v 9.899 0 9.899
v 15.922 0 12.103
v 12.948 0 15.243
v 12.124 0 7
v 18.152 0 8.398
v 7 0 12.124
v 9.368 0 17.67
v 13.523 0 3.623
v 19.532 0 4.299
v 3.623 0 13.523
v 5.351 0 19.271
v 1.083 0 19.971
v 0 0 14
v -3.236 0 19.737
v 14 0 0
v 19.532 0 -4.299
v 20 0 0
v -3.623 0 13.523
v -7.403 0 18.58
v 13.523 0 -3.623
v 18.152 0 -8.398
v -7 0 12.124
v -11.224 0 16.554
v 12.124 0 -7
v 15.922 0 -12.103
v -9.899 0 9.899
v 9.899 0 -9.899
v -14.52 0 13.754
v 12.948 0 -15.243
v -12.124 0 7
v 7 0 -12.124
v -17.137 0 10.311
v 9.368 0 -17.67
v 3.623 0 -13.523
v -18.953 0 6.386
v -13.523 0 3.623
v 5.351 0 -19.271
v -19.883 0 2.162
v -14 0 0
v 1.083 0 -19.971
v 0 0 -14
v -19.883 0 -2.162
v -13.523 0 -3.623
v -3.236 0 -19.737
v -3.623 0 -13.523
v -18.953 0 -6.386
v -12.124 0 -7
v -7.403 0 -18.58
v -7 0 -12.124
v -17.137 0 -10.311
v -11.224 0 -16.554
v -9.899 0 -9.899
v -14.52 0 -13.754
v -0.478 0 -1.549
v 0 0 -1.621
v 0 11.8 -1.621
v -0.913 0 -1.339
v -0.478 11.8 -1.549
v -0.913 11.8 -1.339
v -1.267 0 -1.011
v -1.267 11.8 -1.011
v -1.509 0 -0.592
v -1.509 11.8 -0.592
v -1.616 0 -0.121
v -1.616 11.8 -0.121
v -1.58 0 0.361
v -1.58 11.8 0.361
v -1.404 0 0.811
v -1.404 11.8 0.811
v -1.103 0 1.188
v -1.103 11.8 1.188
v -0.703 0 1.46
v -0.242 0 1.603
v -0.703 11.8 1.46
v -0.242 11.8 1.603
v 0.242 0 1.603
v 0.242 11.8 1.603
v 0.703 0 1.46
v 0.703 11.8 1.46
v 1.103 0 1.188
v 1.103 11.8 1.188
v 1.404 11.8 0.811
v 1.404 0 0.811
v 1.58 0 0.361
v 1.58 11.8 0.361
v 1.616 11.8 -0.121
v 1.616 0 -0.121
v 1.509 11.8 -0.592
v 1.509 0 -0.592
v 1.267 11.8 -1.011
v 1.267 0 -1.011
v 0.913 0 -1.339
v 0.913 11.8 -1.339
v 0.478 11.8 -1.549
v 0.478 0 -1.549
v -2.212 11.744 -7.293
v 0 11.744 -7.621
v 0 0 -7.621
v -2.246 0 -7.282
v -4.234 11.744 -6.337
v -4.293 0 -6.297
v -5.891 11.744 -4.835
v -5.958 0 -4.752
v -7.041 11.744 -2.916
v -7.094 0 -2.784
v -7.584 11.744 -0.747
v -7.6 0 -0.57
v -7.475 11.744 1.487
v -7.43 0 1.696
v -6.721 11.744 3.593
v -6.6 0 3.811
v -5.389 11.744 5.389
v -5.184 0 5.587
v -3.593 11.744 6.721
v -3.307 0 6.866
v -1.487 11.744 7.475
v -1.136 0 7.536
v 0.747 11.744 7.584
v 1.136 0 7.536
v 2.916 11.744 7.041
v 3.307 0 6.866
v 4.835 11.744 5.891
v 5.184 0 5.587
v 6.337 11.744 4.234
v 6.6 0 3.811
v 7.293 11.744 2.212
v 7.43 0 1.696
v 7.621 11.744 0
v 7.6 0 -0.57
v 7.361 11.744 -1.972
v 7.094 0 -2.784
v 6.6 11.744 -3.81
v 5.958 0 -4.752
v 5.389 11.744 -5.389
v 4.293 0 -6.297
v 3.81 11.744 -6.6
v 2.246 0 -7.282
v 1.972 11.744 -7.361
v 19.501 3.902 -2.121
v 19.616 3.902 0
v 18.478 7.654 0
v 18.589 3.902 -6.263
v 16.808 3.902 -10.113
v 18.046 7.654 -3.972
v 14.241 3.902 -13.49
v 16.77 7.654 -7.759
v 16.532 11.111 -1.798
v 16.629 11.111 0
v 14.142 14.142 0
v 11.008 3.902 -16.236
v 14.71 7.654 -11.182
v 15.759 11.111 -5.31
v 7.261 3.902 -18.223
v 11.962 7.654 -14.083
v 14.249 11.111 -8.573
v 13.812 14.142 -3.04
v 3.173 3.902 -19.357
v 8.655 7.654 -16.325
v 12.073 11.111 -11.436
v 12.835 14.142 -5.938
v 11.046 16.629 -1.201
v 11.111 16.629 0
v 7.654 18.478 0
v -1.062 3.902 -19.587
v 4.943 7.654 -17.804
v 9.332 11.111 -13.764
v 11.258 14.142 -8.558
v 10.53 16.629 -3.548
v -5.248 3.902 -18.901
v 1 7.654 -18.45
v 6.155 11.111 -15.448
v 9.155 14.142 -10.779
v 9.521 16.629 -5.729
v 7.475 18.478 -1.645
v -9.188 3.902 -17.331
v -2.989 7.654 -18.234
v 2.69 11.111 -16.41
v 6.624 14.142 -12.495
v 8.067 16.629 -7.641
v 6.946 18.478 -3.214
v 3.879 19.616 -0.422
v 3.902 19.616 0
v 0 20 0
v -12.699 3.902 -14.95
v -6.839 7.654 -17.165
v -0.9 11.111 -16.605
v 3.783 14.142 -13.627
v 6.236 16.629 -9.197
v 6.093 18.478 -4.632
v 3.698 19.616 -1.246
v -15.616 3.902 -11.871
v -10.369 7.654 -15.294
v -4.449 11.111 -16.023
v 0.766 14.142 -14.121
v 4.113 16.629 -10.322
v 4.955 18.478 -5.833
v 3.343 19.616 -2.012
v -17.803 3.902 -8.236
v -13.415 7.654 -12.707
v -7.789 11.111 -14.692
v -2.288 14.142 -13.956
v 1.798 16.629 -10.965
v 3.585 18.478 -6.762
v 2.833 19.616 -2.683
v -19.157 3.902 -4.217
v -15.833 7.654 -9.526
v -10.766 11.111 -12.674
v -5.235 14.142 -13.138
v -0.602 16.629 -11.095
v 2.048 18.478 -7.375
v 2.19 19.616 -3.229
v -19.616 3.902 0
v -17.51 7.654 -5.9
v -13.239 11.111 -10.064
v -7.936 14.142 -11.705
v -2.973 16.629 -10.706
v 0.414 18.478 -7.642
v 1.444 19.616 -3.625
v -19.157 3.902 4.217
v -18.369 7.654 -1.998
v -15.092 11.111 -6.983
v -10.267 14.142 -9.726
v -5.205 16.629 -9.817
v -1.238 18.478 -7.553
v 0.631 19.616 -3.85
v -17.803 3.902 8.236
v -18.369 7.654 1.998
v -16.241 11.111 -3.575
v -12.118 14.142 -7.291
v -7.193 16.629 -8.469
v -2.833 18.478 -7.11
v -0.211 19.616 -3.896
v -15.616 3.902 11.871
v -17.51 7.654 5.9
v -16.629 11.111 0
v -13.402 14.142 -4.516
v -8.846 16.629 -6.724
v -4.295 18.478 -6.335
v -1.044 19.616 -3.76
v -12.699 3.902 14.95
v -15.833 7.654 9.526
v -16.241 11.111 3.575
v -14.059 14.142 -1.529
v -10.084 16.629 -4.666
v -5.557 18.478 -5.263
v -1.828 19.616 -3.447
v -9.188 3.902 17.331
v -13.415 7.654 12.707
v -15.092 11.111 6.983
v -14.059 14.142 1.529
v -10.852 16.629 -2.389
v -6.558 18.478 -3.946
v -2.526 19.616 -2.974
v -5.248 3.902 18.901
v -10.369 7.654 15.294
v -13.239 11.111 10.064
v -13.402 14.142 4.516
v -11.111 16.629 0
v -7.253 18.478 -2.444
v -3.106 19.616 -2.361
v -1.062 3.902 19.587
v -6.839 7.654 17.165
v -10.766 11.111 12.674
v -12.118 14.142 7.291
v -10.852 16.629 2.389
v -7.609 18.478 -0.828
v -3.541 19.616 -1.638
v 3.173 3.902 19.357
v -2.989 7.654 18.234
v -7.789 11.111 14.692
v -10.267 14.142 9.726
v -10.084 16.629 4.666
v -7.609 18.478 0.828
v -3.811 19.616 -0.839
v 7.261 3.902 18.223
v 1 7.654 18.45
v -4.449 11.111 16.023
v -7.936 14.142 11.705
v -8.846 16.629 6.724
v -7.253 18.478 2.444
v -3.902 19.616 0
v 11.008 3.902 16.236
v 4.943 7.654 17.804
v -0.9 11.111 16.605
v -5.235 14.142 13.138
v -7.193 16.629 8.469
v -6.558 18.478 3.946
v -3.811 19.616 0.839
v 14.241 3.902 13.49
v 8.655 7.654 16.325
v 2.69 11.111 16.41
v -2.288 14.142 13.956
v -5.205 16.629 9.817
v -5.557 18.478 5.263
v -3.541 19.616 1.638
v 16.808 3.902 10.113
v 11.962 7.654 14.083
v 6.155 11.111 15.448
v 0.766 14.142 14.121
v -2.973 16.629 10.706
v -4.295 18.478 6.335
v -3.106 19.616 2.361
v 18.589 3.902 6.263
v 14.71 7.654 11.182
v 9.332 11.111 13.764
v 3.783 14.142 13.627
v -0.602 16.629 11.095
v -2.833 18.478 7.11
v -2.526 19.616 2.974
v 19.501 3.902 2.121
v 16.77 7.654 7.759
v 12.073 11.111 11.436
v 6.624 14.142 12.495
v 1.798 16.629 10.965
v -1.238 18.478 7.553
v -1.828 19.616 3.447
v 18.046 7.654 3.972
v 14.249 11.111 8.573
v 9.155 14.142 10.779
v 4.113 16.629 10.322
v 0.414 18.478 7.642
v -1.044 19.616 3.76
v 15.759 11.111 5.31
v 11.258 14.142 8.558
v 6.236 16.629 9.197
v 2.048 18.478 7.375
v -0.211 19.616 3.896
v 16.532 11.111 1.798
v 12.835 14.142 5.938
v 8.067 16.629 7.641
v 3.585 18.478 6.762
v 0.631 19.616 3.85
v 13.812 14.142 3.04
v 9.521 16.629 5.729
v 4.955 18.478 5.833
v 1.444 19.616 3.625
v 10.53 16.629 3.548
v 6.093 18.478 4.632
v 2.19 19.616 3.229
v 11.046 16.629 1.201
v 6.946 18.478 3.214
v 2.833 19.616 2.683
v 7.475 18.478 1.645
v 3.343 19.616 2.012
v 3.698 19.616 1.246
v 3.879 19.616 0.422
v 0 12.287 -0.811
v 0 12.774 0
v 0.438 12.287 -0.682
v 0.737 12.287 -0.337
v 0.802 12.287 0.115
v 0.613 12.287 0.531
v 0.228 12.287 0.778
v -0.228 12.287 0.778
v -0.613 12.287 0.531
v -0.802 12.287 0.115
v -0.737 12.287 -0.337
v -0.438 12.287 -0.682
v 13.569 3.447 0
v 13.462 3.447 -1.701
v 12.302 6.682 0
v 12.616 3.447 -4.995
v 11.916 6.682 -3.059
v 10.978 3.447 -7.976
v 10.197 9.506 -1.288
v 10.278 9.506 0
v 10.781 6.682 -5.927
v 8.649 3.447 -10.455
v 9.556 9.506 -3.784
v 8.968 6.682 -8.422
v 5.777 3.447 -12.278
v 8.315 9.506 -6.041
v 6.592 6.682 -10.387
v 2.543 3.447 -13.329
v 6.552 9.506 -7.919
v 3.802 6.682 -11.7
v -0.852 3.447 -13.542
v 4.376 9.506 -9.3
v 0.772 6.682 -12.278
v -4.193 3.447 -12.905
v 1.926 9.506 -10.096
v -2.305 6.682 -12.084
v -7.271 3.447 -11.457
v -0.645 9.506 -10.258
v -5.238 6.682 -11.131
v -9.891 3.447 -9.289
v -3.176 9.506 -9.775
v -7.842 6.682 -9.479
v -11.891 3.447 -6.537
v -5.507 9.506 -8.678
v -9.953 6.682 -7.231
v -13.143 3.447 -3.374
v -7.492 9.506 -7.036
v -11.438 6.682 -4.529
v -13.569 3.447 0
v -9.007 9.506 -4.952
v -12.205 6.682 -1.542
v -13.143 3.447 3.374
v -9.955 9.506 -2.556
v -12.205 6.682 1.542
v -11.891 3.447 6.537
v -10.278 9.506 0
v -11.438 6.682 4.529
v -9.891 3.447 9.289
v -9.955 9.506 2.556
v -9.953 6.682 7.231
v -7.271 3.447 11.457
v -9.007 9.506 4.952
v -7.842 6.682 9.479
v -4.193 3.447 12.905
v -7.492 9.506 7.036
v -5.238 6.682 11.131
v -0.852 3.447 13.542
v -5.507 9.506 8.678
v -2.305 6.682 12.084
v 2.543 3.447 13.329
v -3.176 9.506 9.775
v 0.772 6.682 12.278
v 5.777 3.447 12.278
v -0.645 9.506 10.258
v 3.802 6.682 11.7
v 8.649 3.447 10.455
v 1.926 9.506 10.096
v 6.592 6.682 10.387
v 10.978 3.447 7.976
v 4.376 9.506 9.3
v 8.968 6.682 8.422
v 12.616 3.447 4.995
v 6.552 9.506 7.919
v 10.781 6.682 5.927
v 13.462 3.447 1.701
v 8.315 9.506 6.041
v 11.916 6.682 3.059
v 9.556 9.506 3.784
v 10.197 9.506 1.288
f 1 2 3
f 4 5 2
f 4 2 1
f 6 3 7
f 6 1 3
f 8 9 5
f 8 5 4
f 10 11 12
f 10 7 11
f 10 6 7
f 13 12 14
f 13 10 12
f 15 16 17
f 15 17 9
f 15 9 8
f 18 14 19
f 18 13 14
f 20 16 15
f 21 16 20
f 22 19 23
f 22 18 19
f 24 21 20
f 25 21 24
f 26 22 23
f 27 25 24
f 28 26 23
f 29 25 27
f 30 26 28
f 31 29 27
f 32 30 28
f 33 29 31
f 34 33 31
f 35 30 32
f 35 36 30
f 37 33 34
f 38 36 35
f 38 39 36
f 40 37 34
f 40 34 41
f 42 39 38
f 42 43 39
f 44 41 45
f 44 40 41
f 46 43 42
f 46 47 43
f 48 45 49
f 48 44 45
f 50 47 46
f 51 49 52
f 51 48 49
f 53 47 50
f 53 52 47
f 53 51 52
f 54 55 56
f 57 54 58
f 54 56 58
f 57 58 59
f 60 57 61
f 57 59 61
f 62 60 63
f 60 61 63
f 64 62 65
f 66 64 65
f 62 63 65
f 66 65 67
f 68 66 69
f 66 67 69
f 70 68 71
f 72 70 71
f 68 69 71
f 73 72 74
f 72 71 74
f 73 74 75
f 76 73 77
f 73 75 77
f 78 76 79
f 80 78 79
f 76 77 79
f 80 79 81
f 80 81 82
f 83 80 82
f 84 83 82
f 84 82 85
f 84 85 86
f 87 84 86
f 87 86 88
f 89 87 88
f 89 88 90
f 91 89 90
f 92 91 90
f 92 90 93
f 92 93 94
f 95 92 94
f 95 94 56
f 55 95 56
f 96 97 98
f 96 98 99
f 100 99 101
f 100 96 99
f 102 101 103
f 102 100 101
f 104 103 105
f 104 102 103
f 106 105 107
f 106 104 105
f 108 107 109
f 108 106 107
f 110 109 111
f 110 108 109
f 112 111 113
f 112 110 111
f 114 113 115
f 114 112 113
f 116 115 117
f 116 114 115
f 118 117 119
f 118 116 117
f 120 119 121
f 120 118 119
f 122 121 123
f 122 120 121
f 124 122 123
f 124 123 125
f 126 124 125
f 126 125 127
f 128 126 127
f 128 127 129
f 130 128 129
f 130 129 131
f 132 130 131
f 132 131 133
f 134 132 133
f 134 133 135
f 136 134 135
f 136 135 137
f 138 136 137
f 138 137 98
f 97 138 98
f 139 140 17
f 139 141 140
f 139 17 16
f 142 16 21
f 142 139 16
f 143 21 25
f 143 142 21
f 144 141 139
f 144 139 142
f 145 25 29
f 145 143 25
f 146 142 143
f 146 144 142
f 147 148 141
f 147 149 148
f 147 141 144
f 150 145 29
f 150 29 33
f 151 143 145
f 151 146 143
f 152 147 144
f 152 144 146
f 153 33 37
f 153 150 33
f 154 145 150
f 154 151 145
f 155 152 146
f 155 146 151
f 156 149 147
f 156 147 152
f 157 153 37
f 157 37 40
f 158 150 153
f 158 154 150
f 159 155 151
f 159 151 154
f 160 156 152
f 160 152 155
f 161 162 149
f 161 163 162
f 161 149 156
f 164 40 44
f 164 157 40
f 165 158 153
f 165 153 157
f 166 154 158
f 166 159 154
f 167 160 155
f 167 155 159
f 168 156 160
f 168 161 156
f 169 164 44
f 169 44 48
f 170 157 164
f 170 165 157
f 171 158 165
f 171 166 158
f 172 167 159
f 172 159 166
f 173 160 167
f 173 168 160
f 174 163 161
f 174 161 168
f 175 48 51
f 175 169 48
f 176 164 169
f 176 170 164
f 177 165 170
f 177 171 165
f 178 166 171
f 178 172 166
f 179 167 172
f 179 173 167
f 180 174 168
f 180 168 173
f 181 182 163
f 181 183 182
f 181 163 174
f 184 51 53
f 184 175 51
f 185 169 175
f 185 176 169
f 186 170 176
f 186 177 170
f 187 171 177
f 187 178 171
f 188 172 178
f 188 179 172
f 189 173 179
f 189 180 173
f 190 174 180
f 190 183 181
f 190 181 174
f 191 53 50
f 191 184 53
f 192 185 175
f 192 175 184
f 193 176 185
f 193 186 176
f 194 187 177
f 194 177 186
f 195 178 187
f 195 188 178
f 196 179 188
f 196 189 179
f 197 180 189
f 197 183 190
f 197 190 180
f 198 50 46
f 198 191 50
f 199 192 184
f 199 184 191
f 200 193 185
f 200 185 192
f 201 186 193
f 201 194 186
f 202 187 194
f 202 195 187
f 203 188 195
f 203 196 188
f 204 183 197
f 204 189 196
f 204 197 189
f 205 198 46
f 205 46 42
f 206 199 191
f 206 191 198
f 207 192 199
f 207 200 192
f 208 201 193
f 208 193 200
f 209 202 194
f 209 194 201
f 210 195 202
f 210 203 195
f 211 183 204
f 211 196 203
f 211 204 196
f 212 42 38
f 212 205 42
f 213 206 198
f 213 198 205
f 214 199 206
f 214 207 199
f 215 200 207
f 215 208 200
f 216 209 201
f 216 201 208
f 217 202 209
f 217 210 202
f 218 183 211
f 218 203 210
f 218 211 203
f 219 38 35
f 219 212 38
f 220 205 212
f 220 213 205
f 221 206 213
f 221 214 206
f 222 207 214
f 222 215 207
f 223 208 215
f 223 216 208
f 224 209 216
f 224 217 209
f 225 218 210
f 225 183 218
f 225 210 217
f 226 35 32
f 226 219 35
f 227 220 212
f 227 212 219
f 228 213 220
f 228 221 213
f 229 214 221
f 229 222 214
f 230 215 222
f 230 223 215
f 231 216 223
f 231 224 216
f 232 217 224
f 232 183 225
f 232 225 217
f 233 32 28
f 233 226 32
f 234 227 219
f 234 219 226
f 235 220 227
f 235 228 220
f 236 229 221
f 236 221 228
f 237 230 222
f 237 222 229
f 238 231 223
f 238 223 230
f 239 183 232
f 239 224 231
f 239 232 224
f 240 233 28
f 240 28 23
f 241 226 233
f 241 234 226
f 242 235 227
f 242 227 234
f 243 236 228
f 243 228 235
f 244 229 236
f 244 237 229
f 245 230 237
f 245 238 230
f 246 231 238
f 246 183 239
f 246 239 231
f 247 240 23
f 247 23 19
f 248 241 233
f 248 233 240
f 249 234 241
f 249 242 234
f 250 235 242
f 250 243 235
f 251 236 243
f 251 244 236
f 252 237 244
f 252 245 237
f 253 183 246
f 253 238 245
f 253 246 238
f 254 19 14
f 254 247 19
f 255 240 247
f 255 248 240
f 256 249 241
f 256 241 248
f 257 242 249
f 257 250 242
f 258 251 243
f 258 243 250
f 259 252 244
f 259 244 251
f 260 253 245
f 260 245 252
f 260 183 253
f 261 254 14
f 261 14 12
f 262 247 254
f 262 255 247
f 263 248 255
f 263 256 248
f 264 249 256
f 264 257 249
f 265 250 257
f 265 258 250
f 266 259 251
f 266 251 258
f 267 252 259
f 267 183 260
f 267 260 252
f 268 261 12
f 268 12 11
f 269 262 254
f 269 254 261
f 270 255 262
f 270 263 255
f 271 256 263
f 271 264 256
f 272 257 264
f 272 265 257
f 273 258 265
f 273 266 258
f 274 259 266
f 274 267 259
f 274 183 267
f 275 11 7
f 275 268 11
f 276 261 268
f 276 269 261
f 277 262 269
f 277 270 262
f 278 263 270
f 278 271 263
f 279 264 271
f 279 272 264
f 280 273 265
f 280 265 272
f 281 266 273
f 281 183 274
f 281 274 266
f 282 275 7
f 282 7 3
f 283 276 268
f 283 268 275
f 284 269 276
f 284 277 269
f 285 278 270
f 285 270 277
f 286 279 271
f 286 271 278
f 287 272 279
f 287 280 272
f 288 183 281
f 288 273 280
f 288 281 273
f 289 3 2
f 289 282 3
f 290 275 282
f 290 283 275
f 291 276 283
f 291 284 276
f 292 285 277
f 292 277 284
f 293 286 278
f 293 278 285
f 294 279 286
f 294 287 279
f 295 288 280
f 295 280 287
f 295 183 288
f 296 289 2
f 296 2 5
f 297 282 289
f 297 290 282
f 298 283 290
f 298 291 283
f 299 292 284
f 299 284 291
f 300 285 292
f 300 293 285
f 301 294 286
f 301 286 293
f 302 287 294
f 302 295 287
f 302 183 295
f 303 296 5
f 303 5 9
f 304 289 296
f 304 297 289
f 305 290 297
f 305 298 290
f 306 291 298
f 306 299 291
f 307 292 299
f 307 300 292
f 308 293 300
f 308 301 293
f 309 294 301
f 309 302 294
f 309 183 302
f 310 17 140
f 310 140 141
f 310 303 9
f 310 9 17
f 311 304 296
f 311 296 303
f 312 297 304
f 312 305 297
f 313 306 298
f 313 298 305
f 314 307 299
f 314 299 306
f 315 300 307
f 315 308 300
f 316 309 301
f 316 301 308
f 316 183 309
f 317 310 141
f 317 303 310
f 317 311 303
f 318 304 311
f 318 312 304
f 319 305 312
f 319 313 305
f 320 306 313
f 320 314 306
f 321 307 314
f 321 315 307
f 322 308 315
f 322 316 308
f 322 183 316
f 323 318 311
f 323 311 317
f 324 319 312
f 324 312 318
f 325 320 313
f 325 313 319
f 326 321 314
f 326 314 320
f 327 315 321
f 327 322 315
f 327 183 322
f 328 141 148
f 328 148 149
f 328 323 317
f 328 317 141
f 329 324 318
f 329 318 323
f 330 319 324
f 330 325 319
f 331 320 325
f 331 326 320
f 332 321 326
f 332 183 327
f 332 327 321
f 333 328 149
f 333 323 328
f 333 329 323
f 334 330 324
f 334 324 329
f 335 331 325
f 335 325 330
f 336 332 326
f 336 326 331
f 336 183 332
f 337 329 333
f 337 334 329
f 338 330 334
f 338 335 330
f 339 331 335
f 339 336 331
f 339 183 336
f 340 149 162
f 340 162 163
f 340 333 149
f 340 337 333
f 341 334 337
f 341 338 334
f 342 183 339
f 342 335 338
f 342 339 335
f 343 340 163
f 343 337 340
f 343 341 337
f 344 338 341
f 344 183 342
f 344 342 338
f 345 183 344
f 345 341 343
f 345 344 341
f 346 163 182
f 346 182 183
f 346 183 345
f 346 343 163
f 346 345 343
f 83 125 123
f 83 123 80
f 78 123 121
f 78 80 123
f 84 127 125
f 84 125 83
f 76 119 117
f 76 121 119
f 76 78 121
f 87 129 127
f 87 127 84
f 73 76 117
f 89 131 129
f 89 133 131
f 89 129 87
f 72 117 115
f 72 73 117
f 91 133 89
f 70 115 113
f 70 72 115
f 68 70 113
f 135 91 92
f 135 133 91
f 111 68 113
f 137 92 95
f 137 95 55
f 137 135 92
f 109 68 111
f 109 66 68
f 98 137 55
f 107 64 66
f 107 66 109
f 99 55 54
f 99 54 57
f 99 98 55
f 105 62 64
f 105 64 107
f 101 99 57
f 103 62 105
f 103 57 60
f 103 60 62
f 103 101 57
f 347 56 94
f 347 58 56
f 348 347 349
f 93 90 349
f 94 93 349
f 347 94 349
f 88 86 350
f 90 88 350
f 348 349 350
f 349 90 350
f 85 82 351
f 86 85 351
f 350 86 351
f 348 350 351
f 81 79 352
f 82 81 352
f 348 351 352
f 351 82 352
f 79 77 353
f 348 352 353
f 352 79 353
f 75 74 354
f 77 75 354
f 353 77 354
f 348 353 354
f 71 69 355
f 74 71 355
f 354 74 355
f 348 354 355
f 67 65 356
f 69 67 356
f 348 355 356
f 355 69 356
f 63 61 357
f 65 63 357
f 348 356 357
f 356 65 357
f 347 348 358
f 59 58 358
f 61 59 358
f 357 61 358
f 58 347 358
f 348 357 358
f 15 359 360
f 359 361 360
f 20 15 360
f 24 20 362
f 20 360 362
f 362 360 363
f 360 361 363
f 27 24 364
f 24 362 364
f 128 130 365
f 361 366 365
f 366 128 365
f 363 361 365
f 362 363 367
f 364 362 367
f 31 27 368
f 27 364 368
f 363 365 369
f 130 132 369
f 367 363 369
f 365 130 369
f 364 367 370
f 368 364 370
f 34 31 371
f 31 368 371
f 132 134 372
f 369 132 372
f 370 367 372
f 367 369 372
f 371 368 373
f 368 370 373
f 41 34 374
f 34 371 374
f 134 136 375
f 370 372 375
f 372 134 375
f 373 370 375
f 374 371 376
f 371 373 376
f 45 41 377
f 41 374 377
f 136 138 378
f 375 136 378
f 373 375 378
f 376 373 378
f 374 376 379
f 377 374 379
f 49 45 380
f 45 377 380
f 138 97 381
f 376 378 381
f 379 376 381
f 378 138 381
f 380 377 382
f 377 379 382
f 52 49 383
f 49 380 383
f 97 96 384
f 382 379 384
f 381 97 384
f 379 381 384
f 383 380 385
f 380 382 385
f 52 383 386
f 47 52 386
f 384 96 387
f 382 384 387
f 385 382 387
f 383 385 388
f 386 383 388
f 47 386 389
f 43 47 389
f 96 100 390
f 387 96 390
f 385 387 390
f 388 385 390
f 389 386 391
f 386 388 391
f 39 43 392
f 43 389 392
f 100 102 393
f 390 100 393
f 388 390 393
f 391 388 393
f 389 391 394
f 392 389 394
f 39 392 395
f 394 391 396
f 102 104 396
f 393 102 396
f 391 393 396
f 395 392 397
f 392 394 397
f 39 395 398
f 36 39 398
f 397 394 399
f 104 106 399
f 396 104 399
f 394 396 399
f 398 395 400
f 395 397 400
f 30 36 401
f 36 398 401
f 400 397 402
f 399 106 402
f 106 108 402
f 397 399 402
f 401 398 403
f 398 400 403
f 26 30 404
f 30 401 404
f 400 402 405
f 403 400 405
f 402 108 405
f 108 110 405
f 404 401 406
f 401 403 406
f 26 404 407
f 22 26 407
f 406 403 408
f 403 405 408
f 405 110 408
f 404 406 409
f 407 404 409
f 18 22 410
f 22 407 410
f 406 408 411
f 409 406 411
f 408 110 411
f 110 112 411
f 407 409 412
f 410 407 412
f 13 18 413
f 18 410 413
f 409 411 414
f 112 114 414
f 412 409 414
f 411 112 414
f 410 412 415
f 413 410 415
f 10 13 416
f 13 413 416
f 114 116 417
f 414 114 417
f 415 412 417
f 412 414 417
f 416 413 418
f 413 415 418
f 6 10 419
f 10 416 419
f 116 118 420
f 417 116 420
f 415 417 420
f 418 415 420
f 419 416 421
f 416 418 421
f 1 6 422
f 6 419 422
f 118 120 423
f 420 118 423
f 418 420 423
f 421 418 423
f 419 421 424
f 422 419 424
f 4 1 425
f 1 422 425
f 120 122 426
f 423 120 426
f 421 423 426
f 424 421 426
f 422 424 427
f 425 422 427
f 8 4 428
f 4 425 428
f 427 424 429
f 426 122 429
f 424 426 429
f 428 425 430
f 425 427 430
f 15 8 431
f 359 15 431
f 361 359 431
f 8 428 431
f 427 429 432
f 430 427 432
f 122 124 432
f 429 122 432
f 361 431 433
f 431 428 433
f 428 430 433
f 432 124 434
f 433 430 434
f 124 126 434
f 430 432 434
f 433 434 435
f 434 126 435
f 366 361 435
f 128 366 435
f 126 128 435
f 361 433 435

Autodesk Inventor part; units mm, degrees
ref_plane "YZ Plane" through (0, 0, 0) normal (1, 0, 0) x (0, 1, 0)
ref_plane "XZ Plane" through (0, 0, 0) normal (0, 1, 0) x (-1, 0, 0)
ref_plane "XY Plane" through (0, 0, 0) normal (0, 0, 1) x (1, 0, 0)
sketch "Sketch1" plane through (0, 0, 0) normal (0, 0, 1) x (1, 0, 0)
  line L0 (0, 0) -> (0, 20)
  line L1 (0, 0) -> (20, 0)
  arc A0 (20, 0) -> (0, 20) centre (0, 0) ccw
  line L2 (0, -4.8284) -> (0, 28.9706) projected
  dimension "d2" = 20
revolve "Revolution1" add sketch "Sketch1" angle 360 about axis through (0, -10, 0) along (0, 1, 0)
sketch "Sketch4" plane through (0, 0, 0) normal (0, -1, 0) x (1, 0, 0)
  point P0 (0, 0)
  point P1 (0, 0)
hole "Hole2" at (0, 0, 0) direction (0, 1, 0) diameter 3.242 depth 11.8 tip angle 118 thread size "M4x0.7" class "6H" standard "ANSI Metric M Profile"
shell "Shell2" thickness 6 removed faces 1 at (13.676, 0, 1.6606)
properties part number "Ball_Upper Half" material "Nylon 6/6"
